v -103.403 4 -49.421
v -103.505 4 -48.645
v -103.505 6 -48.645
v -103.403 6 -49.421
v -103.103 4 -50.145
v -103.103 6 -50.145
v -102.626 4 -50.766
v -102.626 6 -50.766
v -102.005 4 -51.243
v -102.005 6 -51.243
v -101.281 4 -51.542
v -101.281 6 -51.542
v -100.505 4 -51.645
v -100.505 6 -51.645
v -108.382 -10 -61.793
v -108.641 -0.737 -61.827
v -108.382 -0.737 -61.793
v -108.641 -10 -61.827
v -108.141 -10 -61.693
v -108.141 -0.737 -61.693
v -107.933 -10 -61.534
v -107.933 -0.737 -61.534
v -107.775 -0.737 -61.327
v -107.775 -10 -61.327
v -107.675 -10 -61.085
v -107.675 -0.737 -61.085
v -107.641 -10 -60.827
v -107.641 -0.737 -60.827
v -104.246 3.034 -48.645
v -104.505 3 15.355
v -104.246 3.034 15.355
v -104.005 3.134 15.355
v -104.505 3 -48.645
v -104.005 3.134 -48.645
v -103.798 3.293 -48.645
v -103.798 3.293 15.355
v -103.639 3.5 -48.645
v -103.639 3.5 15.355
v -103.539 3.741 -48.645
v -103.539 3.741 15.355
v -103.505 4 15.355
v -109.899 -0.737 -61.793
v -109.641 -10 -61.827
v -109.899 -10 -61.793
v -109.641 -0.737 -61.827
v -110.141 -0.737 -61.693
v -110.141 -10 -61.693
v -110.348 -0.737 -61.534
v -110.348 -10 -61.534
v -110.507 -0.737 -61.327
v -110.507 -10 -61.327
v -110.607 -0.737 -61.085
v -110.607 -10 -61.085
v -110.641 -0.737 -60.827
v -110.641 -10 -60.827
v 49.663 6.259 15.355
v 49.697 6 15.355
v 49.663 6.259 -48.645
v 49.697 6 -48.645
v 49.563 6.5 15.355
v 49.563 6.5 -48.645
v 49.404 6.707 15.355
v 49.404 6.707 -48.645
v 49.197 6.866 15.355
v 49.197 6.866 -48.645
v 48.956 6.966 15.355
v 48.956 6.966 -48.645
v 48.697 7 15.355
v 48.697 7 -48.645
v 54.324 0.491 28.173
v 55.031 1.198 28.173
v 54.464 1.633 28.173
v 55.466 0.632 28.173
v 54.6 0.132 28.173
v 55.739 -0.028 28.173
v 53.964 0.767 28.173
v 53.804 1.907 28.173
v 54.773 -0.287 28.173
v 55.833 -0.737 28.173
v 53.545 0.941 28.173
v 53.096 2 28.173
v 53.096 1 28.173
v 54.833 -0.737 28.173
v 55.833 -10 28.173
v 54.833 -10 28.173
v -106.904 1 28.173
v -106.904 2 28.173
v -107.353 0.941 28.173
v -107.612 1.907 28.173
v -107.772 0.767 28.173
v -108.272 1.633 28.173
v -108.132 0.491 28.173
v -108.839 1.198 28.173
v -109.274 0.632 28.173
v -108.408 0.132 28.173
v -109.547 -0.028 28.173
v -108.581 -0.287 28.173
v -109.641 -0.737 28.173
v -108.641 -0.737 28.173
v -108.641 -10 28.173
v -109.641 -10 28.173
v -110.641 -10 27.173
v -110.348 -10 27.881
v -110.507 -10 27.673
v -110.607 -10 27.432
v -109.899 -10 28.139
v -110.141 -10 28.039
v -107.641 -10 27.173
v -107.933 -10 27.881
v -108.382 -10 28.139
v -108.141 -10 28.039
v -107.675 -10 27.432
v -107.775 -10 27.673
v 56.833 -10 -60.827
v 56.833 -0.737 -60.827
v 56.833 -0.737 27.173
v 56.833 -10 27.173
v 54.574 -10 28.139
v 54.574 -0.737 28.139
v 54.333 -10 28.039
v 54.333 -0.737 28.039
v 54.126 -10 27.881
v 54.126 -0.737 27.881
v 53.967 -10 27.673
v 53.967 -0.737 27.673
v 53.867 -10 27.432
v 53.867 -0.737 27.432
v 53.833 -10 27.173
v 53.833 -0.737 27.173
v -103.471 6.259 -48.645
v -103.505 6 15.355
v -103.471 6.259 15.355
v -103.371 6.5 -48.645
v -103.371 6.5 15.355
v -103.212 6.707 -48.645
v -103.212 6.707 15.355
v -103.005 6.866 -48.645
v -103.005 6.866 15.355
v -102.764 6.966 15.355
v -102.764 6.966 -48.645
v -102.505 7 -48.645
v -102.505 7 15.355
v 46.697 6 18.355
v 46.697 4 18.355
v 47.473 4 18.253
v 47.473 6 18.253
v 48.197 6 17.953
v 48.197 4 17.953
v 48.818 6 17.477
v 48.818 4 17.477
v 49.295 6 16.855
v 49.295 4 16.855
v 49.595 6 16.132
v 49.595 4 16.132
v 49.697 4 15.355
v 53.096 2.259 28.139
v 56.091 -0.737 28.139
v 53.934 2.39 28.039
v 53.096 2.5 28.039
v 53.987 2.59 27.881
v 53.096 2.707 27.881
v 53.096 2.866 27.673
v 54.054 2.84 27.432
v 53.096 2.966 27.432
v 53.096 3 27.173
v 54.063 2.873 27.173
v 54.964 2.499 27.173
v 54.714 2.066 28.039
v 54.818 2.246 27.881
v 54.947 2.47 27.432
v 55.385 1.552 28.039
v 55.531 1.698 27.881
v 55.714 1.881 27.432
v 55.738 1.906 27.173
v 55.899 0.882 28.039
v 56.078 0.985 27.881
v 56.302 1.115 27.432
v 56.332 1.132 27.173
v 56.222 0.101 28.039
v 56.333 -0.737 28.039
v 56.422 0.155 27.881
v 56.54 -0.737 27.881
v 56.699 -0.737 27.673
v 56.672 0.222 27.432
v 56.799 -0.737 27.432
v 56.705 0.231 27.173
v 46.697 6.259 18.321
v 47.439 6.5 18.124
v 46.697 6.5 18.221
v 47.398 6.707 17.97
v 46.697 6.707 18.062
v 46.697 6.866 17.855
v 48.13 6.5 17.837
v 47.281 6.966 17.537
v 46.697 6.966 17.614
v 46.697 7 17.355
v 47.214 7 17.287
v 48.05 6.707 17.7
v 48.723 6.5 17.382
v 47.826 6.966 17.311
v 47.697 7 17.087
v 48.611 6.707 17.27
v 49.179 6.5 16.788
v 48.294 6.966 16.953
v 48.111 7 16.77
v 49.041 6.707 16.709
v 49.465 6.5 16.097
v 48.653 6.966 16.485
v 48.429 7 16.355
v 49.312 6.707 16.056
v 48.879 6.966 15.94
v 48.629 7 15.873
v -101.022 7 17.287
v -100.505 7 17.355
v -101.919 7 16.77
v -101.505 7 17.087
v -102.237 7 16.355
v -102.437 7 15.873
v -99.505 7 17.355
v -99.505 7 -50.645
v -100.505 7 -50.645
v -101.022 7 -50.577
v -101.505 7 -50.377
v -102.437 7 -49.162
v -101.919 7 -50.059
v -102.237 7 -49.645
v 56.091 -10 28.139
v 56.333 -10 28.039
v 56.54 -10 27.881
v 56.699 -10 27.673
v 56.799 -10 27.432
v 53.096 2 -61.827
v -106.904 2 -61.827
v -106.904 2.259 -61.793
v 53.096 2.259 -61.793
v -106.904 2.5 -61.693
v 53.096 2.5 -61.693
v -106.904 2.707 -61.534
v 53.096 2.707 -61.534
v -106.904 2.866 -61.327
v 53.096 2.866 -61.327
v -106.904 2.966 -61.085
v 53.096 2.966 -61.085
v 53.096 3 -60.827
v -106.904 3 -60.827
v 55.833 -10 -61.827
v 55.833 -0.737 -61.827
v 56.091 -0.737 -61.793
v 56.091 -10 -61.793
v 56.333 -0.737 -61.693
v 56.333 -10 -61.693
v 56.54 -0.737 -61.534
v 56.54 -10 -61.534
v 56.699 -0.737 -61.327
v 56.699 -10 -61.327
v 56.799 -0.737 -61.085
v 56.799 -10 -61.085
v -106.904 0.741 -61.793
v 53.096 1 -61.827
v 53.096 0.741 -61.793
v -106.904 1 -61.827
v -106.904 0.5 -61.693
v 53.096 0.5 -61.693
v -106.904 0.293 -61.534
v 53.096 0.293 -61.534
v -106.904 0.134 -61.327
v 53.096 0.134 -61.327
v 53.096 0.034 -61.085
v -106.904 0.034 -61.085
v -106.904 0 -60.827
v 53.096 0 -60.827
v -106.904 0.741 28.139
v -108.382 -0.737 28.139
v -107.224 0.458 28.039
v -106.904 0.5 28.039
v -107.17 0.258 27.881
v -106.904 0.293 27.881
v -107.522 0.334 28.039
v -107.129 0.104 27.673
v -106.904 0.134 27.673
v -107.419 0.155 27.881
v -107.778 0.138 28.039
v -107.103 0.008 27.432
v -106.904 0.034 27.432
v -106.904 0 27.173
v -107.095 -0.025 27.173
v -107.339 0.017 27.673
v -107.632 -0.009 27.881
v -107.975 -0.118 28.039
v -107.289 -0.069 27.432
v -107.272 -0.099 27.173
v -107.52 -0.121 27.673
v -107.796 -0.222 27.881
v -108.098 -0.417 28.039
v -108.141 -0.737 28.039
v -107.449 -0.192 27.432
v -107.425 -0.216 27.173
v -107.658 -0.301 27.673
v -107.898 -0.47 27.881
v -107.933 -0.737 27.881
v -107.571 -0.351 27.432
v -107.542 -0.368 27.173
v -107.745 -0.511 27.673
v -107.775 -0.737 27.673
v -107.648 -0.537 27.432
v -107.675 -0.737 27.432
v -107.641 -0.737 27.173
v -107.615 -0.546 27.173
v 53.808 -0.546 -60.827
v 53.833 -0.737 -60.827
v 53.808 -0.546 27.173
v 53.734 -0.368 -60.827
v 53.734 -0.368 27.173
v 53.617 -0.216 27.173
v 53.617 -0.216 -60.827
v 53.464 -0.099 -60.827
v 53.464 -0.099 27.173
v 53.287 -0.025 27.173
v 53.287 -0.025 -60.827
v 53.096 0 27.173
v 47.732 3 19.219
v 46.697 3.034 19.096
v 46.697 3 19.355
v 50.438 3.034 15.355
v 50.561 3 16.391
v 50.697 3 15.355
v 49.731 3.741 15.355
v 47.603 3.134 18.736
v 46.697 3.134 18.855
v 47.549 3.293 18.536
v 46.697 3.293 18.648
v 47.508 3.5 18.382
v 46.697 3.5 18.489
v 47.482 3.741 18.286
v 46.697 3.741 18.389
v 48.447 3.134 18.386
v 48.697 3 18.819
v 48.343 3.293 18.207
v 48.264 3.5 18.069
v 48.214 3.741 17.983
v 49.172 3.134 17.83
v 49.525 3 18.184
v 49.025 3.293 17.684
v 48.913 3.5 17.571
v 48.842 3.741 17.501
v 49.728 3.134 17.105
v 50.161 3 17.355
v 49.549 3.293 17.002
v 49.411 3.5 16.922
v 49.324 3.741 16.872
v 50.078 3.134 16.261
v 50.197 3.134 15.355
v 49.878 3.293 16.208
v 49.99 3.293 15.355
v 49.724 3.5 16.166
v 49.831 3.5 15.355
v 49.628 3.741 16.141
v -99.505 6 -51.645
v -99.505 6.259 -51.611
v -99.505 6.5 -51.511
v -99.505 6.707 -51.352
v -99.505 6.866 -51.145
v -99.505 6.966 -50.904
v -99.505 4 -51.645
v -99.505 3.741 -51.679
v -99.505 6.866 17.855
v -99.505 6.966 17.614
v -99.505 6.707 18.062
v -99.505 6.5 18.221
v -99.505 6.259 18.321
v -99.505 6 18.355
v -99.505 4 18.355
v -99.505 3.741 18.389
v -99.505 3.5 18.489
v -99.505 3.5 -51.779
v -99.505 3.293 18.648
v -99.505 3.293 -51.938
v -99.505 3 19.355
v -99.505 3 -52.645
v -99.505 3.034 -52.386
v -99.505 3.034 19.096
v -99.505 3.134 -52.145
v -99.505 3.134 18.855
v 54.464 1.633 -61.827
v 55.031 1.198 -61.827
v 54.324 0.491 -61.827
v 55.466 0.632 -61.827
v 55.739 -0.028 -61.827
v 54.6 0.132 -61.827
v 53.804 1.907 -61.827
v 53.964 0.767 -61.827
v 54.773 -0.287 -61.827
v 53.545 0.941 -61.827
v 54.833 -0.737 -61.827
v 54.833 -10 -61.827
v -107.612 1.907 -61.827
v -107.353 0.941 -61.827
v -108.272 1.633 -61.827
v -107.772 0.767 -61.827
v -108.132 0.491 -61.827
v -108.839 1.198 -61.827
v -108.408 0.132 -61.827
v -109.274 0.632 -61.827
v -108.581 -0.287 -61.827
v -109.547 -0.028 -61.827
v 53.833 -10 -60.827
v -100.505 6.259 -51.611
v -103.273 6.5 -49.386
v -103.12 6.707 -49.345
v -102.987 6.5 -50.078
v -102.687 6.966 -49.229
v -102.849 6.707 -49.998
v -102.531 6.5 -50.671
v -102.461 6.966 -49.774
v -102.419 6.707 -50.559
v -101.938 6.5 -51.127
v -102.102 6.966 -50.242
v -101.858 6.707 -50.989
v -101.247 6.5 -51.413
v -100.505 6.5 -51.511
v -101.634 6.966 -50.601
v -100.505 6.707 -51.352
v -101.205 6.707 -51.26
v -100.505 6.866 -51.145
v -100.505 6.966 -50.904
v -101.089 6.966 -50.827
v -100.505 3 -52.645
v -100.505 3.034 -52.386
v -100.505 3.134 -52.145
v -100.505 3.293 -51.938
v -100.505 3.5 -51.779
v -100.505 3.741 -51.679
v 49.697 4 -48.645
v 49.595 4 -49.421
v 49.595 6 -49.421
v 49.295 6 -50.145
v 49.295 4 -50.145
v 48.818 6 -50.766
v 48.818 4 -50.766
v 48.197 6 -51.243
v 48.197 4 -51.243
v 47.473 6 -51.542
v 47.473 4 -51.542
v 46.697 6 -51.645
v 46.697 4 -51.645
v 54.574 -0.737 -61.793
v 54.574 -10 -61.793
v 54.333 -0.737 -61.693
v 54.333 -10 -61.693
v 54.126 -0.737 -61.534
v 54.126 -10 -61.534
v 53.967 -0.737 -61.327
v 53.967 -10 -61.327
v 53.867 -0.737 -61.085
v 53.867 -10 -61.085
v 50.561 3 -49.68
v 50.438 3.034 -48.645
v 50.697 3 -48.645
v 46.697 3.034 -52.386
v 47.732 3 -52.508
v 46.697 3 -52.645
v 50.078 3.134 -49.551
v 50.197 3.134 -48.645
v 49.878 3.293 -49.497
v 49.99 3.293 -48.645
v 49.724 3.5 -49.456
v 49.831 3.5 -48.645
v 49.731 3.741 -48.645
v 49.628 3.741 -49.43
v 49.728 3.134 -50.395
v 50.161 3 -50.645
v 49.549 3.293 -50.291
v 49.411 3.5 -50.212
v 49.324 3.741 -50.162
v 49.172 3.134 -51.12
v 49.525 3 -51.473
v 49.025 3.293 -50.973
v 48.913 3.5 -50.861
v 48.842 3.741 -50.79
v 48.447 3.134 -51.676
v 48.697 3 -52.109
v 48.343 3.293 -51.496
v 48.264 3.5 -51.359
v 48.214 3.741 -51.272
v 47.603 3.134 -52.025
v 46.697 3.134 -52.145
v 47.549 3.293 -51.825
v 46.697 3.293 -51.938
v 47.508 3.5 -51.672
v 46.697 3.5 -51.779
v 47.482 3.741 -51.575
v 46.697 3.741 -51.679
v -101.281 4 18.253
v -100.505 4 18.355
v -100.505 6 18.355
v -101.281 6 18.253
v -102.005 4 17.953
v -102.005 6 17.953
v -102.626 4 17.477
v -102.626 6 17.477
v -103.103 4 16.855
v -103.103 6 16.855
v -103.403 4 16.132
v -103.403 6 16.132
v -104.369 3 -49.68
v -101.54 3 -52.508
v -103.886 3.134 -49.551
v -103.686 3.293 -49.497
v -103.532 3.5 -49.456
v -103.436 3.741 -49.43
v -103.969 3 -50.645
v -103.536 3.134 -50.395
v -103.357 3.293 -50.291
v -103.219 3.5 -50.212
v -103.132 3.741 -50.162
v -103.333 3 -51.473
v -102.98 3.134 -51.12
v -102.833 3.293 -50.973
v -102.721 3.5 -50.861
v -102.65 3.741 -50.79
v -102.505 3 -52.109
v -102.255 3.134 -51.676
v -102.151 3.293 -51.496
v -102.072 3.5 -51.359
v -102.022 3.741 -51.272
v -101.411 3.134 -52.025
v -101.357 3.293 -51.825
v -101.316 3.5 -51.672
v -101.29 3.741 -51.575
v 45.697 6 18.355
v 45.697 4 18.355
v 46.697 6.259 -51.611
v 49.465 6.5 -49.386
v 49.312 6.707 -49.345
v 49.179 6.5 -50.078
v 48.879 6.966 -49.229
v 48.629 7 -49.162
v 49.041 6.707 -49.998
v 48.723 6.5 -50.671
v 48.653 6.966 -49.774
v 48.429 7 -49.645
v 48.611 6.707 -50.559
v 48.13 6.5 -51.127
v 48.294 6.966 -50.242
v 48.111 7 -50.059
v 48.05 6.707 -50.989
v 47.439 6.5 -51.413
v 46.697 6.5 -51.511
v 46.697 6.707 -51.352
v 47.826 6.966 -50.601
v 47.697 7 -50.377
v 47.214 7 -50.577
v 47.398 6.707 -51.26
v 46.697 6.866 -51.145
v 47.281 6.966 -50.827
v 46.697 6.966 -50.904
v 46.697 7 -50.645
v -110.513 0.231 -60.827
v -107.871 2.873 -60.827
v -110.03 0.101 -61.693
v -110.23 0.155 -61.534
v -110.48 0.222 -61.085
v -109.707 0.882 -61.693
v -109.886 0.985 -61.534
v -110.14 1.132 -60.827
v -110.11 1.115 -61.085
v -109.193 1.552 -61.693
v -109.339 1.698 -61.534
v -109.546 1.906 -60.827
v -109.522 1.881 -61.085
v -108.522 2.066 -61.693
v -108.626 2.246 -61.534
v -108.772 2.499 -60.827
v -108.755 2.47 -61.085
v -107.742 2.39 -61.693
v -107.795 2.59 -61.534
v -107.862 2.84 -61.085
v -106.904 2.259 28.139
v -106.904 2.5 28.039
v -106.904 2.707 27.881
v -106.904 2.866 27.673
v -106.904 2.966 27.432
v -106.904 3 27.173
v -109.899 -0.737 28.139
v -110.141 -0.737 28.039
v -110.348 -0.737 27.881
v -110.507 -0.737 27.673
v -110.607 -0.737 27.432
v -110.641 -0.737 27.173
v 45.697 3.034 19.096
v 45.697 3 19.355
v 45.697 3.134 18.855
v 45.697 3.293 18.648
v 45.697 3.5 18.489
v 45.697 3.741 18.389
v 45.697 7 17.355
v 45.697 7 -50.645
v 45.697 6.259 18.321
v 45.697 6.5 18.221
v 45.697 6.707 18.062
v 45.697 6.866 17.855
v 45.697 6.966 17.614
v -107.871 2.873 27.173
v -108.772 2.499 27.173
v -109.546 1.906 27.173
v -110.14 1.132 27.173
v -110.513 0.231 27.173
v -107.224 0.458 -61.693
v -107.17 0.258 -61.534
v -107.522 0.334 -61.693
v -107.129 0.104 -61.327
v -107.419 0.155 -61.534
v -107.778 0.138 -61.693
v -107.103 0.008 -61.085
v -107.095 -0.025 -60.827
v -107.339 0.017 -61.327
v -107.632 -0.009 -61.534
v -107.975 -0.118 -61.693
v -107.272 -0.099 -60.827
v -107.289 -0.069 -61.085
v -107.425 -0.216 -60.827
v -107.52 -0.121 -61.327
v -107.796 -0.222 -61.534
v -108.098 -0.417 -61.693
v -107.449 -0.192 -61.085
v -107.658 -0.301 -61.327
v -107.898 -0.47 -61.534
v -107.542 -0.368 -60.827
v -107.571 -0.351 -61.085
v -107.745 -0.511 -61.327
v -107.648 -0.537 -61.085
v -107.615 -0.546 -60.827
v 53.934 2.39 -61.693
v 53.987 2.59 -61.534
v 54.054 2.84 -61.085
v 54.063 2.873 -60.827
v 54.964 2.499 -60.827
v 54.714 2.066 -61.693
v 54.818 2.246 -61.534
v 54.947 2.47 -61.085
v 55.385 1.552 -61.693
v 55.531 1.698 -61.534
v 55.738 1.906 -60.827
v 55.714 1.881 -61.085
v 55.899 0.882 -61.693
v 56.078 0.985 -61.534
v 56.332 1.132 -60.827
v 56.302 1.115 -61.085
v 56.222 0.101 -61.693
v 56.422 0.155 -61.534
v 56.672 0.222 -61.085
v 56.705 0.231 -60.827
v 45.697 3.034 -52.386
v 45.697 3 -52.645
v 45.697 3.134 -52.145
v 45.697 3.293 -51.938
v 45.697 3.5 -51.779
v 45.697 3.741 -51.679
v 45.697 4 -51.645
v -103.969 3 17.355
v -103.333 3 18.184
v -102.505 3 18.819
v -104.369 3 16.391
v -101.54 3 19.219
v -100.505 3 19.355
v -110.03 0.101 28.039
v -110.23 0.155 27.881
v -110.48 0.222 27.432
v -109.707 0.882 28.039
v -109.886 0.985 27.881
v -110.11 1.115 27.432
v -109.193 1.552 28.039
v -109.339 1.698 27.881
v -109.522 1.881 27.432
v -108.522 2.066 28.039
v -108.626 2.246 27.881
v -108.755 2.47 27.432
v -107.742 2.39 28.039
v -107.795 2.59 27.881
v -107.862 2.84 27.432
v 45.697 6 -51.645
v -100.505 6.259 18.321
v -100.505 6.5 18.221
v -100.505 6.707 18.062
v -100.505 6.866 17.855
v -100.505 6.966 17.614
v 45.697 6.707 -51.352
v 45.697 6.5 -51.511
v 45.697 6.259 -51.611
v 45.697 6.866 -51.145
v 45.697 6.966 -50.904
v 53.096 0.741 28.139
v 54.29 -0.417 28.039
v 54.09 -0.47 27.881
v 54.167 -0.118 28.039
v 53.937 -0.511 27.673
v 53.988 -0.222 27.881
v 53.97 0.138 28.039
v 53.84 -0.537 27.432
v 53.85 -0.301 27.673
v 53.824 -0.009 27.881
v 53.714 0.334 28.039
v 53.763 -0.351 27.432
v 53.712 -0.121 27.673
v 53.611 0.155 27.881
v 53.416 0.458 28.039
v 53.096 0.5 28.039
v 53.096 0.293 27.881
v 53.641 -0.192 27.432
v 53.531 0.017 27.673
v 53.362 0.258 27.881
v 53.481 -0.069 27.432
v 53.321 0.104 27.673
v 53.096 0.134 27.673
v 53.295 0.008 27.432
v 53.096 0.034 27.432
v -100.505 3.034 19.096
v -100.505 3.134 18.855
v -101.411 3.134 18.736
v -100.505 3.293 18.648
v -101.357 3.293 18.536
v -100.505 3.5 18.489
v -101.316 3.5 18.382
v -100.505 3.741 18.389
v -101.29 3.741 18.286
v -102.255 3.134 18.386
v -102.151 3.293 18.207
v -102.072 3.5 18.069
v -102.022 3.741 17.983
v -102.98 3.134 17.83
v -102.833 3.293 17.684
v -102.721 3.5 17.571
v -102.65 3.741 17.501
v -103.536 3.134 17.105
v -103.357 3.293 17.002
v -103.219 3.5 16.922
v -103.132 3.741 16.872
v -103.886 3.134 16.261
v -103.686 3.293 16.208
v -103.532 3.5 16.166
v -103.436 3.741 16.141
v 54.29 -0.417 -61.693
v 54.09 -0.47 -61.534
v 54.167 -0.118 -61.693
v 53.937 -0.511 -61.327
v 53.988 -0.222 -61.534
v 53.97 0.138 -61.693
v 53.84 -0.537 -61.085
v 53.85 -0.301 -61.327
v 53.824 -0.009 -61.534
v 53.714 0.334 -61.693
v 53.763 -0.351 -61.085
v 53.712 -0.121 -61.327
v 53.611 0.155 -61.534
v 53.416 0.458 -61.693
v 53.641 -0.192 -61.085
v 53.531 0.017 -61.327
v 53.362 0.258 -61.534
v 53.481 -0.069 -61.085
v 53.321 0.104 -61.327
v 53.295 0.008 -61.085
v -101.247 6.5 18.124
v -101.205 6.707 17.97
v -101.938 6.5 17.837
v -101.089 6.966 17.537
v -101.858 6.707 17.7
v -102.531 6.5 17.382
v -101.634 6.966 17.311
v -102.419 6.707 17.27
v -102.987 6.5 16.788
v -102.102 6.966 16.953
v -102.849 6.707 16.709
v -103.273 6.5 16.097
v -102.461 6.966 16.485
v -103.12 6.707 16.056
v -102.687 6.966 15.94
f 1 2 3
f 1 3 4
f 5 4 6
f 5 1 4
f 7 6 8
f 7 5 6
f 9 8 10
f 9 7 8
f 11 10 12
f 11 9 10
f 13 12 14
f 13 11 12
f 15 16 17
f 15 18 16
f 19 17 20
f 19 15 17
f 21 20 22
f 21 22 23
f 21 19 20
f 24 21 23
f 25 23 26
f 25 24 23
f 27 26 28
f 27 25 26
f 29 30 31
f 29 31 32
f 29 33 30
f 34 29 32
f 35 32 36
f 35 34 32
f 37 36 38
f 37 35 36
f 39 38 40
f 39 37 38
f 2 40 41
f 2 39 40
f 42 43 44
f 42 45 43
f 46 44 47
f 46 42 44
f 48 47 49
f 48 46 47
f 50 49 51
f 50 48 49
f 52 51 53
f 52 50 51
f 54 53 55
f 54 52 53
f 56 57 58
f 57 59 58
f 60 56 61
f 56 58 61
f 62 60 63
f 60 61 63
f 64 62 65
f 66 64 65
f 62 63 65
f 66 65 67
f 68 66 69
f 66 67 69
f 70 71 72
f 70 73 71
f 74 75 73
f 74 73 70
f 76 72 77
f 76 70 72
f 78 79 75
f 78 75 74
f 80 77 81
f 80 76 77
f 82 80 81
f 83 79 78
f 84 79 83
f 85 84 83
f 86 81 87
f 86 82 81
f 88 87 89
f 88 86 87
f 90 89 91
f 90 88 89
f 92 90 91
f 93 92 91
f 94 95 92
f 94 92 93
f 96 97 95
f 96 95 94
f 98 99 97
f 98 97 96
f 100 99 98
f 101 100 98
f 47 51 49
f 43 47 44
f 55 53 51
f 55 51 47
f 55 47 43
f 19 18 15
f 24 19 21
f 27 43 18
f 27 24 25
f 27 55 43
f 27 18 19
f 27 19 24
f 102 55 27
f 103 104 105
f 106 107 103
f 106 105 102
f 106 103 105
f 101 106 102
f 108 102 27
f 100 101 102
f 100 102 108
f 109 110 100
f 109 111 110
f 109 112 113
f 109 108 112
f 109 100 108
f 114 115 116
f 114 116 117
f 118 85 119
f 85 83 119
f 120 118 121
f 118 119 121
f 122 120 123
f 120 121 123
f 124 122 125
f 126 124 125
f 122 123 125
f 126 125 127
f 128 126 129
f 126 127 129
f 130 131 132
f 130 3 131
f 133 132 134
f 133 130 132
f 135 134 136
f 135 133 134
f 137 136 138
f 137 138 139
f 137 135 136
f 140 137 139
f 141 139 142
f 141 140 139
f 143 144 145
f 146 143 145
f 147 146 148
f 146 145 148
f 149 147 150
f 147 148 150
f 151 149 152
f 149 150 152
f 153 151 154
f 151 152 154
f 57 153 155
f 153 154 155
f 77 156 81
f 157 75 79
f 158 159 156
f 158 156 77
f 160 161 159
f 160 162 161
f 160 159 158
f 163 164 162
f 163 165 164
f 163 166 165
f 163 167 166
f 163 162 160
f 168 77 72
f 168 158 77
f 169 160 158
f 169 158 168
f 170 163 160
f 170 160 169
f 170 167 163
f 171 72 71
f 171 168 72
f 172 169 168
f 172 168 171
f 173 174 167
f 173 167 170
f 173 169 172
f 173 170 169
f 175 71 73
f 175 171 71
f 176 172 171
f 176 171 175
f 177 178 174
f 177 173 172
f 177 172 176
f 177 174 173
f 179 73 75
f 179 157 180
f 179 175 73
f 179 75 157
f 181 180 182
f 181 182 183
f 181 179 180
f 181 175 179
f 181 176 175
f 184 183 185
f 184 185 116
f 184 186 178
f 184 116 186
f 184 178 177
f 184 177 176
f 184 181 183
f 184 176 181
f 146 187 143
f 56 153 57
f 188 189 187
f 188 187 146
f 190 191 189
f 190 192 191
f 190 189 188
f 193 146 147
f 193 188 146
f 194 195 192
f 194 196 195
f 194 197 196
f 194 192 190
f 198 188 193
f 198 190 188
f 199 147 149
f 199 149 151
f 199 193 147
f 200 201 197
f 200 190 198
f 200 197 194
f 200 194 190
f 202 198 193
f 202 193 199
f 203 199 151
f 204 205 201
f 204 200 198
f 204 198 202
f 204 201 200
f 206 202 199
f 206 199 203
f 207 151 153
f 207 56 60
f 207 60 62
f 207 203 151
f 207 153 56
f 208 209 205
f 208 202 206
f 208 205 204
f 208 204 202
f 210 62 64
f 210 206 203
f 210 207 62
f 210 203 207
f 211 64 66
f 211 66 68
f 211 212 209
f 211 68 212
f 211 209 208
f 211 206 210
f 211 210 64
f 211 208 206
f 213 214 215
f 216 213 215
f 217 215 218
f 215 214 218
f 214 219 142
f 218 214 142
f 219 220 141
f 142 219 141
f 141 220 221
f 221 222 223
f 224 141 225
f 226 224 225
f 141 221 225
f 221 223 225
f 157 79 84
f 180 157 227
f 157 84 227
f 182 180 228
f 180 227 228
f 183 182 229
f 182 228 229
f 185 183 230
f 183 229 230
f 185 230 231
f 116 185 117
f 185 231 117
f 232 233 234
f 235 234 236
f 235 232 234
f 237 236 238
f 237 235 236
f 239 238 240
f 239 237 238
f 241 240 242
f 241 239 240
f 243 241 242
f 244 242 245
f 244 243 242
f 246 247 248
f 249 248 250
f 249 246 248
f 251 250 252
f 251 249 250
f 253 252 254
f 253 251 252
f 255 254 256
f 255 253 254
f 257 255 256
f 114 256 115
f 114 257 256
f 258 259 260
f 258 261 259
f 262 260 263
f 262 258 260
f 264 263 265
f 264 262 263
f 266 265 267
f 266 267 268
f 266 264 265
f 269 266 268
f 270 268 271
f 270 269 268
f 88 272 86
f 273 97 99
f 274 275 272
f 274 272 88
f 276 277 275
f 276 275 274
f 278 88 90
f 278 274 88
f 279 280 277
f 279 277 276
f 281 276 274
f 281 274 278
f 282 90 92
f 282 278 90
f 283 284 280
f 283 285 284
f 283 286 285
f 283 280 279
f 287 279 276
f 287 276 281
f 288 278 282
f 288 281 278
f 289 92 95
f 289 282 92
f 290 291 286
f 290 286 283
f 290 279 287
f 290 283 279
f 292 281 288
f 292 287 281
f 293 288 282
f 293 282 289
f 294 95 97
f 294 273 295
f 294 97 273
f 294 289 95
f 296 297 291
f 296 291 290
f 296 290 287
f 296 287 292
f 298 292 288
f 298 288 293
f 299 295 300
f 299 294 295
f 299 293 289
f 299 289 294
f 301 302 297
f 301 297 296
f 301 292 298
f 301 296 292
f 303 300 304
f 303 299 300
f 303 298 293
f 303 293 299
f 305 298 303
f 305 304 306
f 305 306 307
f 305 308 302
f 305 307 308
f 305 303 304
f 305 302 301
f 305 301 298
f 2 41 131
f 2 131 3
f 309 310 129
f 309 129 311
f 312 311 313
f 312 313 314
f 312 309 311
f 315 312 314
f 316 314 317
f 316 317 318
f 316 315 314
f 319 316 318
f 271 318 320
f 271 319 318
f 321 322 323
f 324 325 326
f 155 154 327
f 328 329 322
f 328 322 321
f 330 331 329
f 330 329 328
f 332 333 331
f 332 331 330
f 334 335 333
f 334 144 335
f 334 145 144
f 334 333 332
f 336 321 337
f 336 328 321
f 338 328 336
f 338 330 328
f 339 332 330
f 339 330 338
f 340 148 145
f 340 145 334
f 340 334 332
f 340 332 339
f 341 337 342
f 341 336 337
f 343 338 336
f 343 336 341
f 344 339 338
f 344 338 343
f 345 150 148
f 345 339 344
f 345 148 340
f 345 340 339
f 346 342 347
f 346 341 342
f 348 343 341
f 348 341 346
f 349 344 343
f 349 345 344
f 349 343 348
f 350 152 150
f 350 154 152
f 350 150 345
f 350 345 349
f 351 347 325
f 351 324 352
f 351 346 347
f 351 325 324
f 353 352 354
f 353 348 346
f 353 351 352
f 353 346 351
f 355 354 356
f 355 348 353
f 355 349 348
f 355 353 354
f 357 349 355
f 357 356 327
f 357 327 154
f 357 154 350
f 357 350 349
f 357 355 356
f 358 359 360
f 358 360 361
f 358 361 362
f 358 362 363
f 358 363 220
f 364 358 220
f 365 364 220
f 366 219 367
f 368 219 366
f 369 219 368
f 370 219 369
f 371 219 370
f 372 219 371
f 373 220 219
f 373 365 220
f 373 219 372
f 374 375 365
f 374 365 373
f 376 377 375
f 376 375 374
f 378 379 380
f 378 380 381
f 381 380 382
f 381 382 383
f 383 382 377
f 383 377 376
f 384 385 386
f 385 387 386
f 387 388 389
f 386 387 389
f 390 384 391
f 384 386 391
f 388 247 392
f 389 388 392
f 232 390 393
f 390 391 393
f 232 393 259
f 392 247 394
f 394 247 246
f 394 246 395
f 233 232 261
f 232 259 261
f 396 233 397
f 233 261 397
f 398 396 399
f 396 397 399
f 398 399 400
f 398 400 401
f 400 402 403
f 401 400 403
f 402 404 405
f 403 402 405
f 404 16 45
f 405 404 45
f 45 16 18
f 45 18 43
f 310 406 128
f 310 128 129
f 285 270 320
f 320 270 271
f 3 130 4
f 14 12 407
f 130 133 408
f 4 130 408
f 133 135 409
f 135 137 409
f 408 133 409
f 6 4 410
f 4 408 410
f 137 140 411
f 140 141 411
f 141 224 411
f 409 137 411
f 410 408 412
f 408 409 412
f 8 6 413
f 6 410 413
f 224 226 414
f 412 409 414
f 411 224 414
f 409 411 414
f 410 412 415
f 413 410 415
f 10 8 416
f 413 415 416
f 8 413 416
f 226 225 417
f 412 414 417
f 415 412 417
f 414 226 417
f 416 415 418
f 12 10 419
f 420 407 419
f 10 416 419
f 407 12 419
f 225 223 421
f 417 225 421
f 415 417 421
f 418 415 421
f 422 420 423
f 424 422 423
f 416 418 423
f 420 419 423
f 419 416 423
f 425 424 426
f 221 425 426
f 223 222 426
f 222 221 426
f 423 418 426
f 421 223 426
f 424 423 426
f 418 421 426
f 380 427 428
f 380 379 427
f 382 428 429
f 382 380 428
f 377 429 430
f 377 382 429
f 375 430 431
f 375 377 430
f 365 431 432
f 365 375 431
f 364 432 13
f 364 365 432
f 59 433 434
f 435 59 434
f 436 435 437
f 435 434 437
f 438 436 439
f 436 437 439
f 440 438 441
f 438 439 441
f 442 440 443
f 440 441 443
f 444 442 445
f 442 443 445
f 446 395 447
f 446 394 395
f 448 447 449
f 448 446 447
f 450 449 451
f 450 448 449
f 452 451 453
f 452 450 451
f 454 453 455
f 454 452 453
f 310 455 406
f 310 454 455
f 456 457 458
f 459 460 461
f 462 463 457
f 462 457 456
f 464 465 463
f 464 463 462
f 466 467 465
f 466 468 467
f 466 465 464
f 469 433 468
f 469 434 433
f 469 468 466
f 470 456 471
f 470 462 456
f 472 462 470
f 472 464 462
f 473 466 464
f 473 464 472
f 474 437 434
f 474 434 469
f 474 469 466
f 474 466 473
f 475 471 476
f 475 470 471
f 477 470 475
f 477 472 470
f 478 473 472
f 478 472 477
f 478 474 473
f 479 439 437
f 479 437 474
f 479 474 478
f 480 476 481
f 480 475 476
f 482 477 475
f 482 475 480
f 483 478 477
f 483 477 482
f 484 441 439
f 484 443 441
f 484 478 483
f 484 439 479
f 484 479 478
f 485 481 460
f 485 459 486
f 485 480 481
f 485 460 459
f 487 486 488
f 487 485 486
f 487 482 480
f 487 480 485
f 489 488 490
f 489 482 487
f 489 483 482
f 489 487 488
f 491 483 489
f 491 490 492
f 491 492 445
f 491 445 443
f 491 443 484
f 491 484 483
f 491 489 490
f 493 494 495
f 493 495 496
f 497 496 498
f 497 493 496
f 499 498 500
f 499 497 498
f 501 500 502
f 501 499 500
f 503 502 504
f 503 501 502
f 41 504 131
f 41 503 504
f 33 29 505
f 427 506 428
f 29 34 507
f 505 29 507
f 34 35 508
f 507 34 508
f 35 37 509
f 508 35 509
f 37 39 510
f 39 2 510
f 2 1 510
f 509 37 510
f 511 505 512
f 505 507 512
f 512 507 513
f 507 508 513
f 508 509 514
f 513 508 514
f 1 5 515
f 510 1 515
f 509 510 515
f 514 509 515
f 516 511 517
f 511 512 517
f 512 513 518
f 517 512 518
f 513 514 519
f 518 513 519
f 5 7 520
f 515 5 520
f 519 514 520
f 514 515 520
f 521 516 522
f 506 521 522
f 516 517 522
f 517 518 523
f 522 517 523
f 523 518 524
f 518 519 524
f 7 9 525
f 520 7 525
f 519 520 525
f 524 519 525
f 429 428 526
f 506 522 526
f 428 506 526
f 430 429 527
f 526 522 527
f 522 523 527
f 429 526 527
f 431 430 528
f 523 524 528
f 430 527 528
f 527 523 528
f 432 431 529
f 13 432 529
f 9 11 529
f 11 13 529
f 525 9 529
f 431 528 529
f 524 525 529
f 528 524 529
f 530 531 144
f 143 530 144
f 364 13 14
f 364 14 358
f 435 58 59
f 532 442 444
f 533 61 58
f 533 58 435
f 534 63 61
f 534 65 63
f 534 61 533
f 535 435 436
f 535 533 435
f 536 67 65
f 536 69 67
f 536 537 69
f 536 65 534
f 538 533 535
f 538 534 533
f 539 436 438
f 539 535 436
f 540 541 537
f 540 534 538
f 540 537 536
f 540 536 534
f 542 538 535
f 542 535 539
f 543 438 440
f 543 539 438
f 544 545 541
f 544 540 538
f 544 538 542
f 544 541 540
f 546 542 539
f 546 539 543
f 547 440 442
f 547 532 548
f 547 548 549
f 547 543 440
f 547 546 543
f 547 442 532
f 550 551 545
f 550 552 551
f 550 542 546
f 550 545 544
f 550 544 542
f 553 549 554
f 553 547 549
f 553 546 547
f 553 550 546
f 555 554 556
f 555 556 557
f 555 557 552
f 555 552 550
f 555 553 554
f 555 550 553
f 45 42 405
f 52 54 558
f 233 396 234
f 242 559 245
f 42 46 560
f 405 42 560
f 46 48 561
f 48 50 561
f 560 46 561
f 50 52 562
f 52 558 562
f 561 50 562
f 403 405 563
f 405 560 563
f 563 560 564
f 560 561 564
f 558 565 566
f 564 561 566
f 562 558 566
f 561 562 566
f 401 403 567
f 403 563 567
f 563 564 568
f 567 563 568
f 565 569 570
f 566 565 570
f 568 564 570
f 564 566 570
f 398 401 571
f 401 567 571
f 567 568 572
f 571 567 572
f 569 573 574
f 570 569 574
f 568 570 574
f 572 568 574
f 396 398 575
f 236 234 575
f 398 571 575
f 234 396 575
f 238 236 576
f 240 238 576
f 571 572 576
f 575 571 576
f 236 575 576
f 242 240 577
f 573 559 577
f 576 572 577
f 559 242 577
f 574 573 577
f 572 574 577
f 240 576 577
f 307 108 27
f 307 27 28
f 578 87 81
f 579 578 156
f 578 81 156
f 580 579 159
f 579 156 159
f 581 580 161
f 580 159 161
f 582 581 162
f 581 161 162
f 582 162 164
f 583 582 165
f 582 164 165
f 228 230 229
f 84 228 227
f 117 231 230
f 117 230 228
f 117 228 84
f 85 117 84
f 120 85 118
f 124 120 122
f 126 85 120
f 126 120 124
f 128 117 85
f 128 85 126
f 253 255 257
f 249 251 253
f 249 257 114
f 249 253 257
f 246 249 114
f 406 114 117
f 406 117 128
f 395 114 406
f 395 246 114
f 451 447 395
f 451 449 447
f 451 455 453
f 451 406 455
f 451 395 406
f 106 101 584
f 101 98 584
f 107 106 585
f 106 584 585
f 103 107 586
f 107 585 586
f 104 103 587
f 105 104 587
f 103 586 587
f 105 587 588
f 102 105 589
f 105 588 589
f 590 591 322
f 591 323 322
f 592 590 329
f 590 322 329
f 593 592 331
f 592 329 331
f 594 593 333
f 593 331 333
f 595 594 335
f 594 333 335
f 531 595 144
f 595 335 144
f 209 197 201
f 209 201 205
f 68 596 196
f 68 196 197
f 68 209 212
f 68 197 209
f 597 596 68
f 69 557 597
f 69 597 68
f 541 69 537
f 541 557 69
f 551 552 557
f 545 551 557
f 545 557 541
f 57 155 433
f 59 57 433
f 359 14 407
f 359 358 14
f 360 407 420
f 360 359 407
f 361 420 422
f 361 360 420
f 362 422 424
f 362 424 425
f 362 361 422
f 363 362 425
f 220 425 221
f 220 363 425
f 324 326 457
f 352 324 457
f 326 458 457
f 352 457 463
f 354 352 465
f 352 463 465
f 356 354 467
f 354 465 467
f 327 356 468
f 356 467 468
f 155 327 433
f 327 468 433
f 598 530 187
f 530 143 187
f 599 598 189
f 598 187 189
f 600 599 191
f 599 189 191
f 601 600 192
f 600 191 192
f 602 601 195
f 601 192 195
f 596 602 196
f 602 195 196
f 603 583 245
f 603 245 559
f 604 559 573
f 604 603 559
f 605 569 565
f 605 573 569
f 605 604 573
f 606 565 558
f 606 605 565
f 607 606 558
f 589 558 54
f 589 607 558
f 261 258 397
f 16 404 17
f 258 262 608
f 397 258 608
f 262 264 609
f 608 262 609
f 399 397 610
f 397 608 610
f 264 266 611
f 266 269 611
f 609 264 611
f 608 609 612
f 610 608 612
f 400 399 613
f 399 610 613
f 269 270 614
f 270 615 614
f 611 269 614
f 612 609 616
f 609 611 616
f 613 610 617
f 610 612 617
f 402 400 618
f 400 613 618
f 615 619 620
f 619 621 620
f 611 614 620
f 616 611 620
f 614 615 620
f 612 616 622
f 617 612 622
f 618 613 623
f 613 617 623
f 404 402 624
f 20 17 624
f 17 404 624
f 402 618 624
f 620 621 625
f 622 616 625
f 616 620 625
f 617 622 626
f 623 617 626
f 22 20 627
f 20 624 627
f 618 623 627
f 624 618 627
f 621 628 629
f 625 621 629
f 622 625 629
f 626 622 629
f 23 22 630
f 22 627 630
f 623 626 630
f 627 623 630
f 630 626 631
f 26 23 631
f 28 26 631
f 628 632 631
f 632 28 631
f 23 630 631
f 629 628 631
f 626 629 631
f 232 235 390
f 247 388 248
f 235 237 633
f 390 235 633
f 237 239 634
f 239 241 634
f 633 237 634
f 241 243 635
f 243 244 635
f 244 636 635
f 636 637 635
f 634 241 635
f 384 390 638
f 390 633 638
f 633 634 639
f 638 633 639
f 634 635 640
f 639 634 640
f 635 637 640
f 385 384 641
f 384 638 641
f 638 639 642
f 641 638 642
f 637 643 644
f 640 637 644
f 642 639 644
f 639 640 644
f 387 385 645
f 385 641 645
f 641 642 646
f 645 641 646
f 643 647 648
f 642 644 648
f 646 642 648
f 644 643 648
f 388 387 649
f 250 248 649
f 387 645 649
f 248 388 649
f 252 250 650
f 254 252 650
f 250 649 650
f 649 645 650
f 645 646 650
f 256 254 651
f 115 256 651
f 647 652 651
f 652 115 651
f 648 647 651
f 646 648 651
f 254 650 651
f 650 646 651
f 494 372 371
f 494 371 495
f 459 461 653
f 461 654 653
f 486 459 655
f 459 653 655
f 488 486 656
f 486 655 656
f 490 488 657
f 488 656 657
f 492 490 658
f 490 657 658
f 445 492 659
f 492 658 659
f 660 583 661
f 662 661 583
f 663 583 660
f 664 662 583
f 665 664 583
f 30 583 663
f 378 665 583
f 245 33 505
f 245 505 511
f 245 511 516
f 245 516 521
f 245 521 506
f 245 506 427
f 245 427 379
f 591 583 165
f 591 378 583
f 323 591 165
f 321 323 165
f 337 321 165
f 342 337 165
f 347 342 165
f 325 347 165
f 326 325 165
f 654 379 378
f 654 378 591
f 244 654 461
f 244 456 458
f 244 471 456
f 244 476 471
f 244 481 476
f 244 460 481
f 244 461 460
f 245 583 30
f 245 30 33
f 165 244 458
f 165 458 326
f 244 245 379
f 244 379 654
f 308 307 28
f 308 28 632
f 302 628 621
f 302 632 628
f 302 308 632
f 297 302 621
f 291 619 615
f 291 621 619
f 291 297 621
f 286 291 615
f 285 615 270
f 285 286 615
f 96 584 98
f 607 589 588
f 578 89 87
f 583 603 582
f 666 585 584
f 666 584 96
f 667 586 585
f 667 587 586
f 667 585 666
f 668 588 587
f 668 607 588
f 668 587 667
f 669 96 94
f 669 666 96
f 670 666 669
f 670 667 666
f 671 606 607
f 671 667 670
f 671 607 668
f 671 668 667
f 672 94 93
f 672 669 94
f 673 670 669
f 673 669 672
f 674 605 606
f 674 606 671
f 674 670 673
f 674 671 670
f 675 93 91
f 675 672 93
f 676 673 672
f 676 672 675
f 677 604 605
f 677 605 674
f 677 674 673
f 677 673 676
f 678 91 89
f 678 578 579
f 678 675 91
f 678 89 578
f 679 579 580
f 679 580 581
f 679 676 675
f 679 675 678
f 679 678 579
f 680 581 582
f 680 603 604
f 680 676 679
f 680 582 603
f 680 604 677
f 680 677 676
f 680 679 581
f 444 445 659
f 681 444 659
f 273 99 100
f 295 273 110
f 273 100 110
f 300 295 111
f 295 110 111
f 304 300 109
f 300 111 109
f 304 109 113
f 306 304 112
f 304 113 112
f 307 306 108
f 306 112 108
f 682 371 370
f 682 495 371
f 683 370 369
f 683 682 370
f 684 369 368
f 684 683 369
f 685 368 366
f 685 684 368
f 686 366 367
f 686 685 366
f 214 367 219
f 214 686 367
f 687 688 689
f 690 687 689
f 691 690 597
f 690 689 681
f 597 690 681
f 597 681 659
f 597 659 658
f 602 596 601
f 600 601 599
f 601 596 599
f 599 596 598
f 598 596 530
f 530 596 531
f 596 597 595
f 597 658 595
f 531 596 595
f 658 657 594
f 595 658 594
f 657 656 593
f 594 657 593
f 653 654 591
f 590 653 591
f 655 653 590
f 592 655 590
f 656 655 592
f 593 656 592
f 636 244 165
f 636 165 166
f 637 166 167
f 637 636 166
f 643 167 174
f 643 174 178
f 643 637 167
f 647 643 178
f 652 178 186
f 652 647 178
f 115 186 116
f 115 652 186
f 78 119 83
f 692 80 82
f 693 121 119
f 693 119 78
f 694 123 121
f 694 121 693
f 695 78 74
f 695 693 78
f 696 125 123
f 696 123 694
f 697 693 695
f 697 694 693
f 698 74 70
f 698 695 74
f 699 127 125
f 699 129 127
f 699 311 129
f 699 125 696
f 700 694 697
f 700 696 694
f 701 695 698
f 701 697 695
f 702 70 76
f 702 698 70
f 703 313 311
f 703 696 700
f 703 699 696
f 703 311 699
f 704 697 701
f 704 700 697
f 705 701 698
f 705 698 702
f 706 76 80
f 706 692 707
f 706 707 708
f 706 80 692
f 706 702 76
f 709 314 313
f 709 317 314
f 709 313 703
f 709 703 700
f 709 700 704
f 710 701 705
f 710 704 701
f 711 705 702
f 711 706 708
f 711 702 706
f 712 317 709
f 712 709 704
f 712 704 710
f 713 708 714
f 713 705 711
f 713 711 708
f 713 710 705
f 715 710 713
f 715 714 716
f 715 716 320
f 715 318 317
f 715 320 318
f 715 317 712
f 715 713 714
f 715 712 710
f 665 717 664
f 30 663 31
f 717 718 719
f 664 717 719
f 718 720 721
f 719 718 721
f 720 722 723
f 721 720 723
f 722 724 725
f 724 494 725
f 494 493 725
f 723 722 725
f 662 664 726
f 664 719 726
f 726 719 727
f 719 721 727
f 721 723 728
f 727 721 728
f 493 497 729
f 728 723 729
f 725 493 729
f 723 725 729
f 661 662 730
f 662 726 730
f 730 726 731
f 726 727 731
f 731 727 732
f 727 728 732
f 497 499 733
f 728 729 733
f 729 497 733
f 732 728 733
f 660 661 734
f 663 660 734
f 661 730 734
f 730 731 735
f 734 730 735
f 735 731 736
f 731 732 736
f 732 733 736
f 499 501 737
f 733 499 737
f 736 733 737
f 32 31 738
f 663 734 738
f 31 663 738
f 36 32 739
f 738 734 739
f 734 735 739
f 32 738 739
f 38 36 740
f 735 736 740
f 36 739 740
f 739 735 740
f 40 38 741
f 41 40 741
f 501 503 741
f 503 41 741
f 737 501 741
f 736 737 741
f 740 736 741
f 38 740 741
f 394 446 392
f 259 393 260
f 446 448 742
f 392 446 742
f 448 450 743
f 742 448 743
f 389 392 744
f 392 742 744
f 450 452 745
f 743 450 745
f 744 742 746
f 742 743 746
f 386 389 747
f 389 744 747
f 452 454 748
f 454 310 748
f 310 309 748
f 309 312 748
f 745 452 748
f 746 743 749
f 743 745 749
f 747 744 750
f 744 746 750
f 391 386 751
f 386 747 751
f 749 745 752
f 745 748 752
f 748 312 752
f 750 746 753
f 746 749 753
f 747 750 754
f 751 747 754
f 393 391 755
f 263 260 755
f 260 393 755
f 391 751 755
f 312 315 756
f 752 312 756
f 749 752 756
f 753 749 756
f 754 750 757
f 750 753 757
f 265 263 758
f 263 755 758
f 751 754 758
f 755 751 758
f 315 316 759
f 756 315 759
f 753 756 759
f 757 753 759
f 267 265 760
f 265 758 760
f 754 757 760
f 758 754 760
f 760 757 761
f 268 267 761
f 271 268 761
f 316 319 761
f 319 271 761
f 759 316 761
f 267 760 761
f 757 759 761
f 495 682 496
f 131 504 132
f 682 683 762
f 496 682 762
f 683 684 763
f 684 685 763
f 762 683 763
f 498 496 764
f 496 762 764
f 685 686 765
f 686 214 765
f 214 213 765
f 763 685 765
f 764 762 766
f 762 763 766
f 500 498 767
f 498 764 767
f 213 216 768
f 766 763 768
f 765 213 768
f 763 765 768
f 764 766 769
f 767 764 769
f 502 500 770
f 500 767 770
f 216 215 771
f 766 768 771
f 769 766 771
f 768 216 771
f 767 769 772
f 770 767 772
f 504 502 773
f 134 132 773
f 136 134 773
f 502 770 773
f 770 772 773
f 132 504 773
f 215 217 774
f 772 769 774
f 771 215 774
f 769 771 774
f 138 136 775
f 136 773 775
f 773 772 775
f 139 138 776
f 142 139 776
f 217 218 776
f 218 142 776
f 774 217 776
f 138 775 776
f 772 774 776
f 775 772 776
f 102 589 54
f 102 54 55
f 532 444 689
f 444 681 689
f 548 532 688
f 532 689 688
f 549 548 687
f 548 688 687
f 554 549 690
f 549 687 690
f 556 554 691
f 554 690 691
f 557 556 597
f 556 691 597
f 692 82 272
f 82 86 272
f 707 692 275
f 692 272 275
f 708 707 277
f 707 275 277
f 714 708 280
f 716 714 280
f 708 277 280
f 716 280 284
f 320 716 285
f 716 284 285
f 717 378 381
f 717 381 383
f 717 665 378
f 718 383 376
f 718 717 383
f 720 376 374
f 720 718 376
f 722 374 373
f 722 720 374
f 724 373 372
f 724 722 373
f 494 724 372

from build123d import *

# Parameters (mm, degrees)
ESQUISSE1_W                 = 160
ESQUISSE1_H                 = 90
T_LE_DE_BASE_PLI_E1_DEPTH   = 3
T_LE_PLI_E_SUR_AR_TE1_DEPTH = 90
T_LE_PLI_E_SUR_AR_TE2_DEPTH = 90
EXTRUSION1_DEPTH            = 4
CONG_2_R                    = 1
CONG_3_R                    = 1
CONG_4_R                    = 1


# Sheet-metal steps are written as plain solids
with BuildPart() as part:
    # Esquisse1 → Tôle de base pliée1 (new body)
    with BuildSketch(Plane(origin=(0, 0, 0), x_dir=(1, 0, 0), z_dir=(0, 1, 0))):
        with Locations((-26.903987823, 16.826605784)):
            Rectangle(ESQUISSE1_W, ESQUISSE1_H)
    extrude(amount=T_LE_DE_BASE_PLI_E1_DEPTH)

    # Tôle pliée sur arête1 section (across the edge) → Tôle pliée sur arête1 (add)
    with BuildSketch(Plane(origin=(53.832612177, 0, -61.826605784), x_dir=(-1, 0, 0), z_dir=(0, 0, 1))):
        with BuildLine():
            Line((-3, 0.7366), (-3, 10))
            Line((-3, 10), (0, 10))
            Line((0, 10), (0, 0.7366))
            ThreePointArc((0, 0.7366), (0.215745145, 0.215745145), (0.7366, 0))
            Line((0.7366, 0), (0.7366, -3))
            ThreePointArc((0.7366, -3), (-1.905575199, -1.905575199), (-3, 0.7366))
        make_face()
    extrude(amount=T_LE_PLI_E_SUR_AR_TE1_DEPTH)

    # Tôle pliée sur arête2 section (across the edge) → Tôle pliée sur arête2 (add)
    with BuildSketch(Plane(origin=(-107.640587823, 0, 28.173394216), x_dir=(1, 0, 0), z_dir=(0, 0, -1))):
        with BuildLine():
            Line((-3, 0.7366), (-3, 10))
            Line((-3, 10), (0, 10))
            Line((0, 10), (0, 0.7366))
            ThreePointArc((0, 0.7366), (0.215745145, 0.215745145), (0.7366, 0))
            Line((0.7366, 0), (0.7366, -3))
            ThreePointArc((0.7366, -3), (-1.905575199, -1.905575199), (-3, 0.7366))
        make_face()
    extrude(amount=T_LE_PLI_E_SUR_AR_TE2_DEPTH)

    # Esquisse9 → Extrusion1 (add)
    with BuildSketch(Plane(origin=(0, 3, 0), x_dir=(1, 0, 0), z_dir=(0, 1, 0))):
        with BuildLine():
            Line((-100.504826498, 51.644704016), (-99.504826498, 51.644704016))
            Line((-99.504826498, 51.644704016), (-99.504826498, -18.355295984))
            Line((-99.504826498, -18.355295984), (-100.504826498, -18.355295984))
            ThreePointArc((-100.504826498, -18.355295984), (-102.626146841, -17.476616327), (-103.504826498, -15.355295984))
            Line((-103.504826498, -15.355295984), (-103.504826498, 48.644704016))
            ThreePointArc((-103.504826498, 48.644704016), (-102.626146841, 50.76602436), (-100.504826498, 51.644704016))
        make_face()
        with BuildLine():
            Line((45.696850851, 51.644704016), (45.696850851, -18.355295984))
            Line((45.696850851, -18.355295984), (46.696850851, -18.355295984))
            ThreePointArc((46.696850851, -18.355295984), (48.818171195, -17.476616327), (49.696850851, -15.355295984))
            Line((49.696850851, -15.355295984), (49.696850851, 48.644704016))
            ThreePointArc((49.696850851, 48.644704016), (48.818171195, 50.76602436), (46.696850851, 51.644704016))
            Line((46.696850851, 51.644704016), (45.696850851, 51.644704016))
        make_face()
    extrude(amount=EXTRUSION1_DEPTH)

    # Congé2
    cong_2_edges = [part.edges().sort_by_distance(p)[0] for p in [
        (-26.903987823, 3, -61.826605784),
        (55.738187375, 1.905575199, -61.826605784),
        (55.738187375, 1.905575199, 28.173394216),
        (53.616867032, -0.215745145, -61.826605784),
        (53.616867032, -0.215745145, 28.173394216),
        (53.832612177, -5.3683, 28.173394216),
        (53.832612177, -5.3683, -61.826605784),
        (56.832612177, -5.3683, 28.173394216),
        (56.832612177, -5.3683, -61.826605784),
        (-109.546163022, 1.905575199, 28.173394216),
        (-109.546163022, 1.905575199, -61.826605784),
        (-107.424842678, -0.215745145, 28.173394216),
        (-107.424842678, -0.215745145, -61.826605784),
        (-26.903987823, 0, -61.826605784),
        (-107.640587823, -5.3683, -61.826605784),
        (-107.640587823, -5.3683, 28.173394216),
        (-110.640587823, -5.3683, -61.826605784),
        (-110.640587823, -5.3683, 28.173394216),
        (-26.903987823, 0, 28.173394216),
        (-26.903987823, 3, 28.173394216),
    ]]
    fillet(cong_2_edges, radius=CONG_2_R)

    # Congé3
    cong_3_edges = [part.edges().sort_by_distance(p)[0] for p in [
        (-100.004826498, 7, -51.644704016),
        (-102.626146841, 7, -50.76602436),
        (-103.504826498, 7, -16.644704016),
        (-102.626146841, 7, 17.476616327),
        (-100.004826498, 7, 18.355295984),
        (48.818171195, 7, 17.476616327),
        (49.696850851, 7, -16.644704016),
        (48.818171195, 7, -50.76602436),
        (46.196850851, 7, -51.644704016),
        (46.196850851, 7, 18.355295984),
    ]]
    fillet(cong_3_edges, radius=CONG_3_R)

    # Congé4
    cong_4_edges = [part.edges().sort_by_distance(p)[0] for p in [
        (-100.004826498, 3, -51.644704016),
        (-102.626146841, 3, -50.76602436),
        (-103.504826498, 3, -16.644704016),
        (-102.626146841, 3, 17.476616327),
        (-100.004826498, 3, 18.355295984),
        (48.818171195, 3, 17.476616327),
        (49.696850851, 3, -16.644704016),
        (48.818171195, 3, -50.76602436),
        (46.196850851, 3, -51.644704016),
        (46.196850851, 3, 18.355295984),
    ]]
    fillet(cong_4_edges, radius=CONG_4_R)


solid = part.part
